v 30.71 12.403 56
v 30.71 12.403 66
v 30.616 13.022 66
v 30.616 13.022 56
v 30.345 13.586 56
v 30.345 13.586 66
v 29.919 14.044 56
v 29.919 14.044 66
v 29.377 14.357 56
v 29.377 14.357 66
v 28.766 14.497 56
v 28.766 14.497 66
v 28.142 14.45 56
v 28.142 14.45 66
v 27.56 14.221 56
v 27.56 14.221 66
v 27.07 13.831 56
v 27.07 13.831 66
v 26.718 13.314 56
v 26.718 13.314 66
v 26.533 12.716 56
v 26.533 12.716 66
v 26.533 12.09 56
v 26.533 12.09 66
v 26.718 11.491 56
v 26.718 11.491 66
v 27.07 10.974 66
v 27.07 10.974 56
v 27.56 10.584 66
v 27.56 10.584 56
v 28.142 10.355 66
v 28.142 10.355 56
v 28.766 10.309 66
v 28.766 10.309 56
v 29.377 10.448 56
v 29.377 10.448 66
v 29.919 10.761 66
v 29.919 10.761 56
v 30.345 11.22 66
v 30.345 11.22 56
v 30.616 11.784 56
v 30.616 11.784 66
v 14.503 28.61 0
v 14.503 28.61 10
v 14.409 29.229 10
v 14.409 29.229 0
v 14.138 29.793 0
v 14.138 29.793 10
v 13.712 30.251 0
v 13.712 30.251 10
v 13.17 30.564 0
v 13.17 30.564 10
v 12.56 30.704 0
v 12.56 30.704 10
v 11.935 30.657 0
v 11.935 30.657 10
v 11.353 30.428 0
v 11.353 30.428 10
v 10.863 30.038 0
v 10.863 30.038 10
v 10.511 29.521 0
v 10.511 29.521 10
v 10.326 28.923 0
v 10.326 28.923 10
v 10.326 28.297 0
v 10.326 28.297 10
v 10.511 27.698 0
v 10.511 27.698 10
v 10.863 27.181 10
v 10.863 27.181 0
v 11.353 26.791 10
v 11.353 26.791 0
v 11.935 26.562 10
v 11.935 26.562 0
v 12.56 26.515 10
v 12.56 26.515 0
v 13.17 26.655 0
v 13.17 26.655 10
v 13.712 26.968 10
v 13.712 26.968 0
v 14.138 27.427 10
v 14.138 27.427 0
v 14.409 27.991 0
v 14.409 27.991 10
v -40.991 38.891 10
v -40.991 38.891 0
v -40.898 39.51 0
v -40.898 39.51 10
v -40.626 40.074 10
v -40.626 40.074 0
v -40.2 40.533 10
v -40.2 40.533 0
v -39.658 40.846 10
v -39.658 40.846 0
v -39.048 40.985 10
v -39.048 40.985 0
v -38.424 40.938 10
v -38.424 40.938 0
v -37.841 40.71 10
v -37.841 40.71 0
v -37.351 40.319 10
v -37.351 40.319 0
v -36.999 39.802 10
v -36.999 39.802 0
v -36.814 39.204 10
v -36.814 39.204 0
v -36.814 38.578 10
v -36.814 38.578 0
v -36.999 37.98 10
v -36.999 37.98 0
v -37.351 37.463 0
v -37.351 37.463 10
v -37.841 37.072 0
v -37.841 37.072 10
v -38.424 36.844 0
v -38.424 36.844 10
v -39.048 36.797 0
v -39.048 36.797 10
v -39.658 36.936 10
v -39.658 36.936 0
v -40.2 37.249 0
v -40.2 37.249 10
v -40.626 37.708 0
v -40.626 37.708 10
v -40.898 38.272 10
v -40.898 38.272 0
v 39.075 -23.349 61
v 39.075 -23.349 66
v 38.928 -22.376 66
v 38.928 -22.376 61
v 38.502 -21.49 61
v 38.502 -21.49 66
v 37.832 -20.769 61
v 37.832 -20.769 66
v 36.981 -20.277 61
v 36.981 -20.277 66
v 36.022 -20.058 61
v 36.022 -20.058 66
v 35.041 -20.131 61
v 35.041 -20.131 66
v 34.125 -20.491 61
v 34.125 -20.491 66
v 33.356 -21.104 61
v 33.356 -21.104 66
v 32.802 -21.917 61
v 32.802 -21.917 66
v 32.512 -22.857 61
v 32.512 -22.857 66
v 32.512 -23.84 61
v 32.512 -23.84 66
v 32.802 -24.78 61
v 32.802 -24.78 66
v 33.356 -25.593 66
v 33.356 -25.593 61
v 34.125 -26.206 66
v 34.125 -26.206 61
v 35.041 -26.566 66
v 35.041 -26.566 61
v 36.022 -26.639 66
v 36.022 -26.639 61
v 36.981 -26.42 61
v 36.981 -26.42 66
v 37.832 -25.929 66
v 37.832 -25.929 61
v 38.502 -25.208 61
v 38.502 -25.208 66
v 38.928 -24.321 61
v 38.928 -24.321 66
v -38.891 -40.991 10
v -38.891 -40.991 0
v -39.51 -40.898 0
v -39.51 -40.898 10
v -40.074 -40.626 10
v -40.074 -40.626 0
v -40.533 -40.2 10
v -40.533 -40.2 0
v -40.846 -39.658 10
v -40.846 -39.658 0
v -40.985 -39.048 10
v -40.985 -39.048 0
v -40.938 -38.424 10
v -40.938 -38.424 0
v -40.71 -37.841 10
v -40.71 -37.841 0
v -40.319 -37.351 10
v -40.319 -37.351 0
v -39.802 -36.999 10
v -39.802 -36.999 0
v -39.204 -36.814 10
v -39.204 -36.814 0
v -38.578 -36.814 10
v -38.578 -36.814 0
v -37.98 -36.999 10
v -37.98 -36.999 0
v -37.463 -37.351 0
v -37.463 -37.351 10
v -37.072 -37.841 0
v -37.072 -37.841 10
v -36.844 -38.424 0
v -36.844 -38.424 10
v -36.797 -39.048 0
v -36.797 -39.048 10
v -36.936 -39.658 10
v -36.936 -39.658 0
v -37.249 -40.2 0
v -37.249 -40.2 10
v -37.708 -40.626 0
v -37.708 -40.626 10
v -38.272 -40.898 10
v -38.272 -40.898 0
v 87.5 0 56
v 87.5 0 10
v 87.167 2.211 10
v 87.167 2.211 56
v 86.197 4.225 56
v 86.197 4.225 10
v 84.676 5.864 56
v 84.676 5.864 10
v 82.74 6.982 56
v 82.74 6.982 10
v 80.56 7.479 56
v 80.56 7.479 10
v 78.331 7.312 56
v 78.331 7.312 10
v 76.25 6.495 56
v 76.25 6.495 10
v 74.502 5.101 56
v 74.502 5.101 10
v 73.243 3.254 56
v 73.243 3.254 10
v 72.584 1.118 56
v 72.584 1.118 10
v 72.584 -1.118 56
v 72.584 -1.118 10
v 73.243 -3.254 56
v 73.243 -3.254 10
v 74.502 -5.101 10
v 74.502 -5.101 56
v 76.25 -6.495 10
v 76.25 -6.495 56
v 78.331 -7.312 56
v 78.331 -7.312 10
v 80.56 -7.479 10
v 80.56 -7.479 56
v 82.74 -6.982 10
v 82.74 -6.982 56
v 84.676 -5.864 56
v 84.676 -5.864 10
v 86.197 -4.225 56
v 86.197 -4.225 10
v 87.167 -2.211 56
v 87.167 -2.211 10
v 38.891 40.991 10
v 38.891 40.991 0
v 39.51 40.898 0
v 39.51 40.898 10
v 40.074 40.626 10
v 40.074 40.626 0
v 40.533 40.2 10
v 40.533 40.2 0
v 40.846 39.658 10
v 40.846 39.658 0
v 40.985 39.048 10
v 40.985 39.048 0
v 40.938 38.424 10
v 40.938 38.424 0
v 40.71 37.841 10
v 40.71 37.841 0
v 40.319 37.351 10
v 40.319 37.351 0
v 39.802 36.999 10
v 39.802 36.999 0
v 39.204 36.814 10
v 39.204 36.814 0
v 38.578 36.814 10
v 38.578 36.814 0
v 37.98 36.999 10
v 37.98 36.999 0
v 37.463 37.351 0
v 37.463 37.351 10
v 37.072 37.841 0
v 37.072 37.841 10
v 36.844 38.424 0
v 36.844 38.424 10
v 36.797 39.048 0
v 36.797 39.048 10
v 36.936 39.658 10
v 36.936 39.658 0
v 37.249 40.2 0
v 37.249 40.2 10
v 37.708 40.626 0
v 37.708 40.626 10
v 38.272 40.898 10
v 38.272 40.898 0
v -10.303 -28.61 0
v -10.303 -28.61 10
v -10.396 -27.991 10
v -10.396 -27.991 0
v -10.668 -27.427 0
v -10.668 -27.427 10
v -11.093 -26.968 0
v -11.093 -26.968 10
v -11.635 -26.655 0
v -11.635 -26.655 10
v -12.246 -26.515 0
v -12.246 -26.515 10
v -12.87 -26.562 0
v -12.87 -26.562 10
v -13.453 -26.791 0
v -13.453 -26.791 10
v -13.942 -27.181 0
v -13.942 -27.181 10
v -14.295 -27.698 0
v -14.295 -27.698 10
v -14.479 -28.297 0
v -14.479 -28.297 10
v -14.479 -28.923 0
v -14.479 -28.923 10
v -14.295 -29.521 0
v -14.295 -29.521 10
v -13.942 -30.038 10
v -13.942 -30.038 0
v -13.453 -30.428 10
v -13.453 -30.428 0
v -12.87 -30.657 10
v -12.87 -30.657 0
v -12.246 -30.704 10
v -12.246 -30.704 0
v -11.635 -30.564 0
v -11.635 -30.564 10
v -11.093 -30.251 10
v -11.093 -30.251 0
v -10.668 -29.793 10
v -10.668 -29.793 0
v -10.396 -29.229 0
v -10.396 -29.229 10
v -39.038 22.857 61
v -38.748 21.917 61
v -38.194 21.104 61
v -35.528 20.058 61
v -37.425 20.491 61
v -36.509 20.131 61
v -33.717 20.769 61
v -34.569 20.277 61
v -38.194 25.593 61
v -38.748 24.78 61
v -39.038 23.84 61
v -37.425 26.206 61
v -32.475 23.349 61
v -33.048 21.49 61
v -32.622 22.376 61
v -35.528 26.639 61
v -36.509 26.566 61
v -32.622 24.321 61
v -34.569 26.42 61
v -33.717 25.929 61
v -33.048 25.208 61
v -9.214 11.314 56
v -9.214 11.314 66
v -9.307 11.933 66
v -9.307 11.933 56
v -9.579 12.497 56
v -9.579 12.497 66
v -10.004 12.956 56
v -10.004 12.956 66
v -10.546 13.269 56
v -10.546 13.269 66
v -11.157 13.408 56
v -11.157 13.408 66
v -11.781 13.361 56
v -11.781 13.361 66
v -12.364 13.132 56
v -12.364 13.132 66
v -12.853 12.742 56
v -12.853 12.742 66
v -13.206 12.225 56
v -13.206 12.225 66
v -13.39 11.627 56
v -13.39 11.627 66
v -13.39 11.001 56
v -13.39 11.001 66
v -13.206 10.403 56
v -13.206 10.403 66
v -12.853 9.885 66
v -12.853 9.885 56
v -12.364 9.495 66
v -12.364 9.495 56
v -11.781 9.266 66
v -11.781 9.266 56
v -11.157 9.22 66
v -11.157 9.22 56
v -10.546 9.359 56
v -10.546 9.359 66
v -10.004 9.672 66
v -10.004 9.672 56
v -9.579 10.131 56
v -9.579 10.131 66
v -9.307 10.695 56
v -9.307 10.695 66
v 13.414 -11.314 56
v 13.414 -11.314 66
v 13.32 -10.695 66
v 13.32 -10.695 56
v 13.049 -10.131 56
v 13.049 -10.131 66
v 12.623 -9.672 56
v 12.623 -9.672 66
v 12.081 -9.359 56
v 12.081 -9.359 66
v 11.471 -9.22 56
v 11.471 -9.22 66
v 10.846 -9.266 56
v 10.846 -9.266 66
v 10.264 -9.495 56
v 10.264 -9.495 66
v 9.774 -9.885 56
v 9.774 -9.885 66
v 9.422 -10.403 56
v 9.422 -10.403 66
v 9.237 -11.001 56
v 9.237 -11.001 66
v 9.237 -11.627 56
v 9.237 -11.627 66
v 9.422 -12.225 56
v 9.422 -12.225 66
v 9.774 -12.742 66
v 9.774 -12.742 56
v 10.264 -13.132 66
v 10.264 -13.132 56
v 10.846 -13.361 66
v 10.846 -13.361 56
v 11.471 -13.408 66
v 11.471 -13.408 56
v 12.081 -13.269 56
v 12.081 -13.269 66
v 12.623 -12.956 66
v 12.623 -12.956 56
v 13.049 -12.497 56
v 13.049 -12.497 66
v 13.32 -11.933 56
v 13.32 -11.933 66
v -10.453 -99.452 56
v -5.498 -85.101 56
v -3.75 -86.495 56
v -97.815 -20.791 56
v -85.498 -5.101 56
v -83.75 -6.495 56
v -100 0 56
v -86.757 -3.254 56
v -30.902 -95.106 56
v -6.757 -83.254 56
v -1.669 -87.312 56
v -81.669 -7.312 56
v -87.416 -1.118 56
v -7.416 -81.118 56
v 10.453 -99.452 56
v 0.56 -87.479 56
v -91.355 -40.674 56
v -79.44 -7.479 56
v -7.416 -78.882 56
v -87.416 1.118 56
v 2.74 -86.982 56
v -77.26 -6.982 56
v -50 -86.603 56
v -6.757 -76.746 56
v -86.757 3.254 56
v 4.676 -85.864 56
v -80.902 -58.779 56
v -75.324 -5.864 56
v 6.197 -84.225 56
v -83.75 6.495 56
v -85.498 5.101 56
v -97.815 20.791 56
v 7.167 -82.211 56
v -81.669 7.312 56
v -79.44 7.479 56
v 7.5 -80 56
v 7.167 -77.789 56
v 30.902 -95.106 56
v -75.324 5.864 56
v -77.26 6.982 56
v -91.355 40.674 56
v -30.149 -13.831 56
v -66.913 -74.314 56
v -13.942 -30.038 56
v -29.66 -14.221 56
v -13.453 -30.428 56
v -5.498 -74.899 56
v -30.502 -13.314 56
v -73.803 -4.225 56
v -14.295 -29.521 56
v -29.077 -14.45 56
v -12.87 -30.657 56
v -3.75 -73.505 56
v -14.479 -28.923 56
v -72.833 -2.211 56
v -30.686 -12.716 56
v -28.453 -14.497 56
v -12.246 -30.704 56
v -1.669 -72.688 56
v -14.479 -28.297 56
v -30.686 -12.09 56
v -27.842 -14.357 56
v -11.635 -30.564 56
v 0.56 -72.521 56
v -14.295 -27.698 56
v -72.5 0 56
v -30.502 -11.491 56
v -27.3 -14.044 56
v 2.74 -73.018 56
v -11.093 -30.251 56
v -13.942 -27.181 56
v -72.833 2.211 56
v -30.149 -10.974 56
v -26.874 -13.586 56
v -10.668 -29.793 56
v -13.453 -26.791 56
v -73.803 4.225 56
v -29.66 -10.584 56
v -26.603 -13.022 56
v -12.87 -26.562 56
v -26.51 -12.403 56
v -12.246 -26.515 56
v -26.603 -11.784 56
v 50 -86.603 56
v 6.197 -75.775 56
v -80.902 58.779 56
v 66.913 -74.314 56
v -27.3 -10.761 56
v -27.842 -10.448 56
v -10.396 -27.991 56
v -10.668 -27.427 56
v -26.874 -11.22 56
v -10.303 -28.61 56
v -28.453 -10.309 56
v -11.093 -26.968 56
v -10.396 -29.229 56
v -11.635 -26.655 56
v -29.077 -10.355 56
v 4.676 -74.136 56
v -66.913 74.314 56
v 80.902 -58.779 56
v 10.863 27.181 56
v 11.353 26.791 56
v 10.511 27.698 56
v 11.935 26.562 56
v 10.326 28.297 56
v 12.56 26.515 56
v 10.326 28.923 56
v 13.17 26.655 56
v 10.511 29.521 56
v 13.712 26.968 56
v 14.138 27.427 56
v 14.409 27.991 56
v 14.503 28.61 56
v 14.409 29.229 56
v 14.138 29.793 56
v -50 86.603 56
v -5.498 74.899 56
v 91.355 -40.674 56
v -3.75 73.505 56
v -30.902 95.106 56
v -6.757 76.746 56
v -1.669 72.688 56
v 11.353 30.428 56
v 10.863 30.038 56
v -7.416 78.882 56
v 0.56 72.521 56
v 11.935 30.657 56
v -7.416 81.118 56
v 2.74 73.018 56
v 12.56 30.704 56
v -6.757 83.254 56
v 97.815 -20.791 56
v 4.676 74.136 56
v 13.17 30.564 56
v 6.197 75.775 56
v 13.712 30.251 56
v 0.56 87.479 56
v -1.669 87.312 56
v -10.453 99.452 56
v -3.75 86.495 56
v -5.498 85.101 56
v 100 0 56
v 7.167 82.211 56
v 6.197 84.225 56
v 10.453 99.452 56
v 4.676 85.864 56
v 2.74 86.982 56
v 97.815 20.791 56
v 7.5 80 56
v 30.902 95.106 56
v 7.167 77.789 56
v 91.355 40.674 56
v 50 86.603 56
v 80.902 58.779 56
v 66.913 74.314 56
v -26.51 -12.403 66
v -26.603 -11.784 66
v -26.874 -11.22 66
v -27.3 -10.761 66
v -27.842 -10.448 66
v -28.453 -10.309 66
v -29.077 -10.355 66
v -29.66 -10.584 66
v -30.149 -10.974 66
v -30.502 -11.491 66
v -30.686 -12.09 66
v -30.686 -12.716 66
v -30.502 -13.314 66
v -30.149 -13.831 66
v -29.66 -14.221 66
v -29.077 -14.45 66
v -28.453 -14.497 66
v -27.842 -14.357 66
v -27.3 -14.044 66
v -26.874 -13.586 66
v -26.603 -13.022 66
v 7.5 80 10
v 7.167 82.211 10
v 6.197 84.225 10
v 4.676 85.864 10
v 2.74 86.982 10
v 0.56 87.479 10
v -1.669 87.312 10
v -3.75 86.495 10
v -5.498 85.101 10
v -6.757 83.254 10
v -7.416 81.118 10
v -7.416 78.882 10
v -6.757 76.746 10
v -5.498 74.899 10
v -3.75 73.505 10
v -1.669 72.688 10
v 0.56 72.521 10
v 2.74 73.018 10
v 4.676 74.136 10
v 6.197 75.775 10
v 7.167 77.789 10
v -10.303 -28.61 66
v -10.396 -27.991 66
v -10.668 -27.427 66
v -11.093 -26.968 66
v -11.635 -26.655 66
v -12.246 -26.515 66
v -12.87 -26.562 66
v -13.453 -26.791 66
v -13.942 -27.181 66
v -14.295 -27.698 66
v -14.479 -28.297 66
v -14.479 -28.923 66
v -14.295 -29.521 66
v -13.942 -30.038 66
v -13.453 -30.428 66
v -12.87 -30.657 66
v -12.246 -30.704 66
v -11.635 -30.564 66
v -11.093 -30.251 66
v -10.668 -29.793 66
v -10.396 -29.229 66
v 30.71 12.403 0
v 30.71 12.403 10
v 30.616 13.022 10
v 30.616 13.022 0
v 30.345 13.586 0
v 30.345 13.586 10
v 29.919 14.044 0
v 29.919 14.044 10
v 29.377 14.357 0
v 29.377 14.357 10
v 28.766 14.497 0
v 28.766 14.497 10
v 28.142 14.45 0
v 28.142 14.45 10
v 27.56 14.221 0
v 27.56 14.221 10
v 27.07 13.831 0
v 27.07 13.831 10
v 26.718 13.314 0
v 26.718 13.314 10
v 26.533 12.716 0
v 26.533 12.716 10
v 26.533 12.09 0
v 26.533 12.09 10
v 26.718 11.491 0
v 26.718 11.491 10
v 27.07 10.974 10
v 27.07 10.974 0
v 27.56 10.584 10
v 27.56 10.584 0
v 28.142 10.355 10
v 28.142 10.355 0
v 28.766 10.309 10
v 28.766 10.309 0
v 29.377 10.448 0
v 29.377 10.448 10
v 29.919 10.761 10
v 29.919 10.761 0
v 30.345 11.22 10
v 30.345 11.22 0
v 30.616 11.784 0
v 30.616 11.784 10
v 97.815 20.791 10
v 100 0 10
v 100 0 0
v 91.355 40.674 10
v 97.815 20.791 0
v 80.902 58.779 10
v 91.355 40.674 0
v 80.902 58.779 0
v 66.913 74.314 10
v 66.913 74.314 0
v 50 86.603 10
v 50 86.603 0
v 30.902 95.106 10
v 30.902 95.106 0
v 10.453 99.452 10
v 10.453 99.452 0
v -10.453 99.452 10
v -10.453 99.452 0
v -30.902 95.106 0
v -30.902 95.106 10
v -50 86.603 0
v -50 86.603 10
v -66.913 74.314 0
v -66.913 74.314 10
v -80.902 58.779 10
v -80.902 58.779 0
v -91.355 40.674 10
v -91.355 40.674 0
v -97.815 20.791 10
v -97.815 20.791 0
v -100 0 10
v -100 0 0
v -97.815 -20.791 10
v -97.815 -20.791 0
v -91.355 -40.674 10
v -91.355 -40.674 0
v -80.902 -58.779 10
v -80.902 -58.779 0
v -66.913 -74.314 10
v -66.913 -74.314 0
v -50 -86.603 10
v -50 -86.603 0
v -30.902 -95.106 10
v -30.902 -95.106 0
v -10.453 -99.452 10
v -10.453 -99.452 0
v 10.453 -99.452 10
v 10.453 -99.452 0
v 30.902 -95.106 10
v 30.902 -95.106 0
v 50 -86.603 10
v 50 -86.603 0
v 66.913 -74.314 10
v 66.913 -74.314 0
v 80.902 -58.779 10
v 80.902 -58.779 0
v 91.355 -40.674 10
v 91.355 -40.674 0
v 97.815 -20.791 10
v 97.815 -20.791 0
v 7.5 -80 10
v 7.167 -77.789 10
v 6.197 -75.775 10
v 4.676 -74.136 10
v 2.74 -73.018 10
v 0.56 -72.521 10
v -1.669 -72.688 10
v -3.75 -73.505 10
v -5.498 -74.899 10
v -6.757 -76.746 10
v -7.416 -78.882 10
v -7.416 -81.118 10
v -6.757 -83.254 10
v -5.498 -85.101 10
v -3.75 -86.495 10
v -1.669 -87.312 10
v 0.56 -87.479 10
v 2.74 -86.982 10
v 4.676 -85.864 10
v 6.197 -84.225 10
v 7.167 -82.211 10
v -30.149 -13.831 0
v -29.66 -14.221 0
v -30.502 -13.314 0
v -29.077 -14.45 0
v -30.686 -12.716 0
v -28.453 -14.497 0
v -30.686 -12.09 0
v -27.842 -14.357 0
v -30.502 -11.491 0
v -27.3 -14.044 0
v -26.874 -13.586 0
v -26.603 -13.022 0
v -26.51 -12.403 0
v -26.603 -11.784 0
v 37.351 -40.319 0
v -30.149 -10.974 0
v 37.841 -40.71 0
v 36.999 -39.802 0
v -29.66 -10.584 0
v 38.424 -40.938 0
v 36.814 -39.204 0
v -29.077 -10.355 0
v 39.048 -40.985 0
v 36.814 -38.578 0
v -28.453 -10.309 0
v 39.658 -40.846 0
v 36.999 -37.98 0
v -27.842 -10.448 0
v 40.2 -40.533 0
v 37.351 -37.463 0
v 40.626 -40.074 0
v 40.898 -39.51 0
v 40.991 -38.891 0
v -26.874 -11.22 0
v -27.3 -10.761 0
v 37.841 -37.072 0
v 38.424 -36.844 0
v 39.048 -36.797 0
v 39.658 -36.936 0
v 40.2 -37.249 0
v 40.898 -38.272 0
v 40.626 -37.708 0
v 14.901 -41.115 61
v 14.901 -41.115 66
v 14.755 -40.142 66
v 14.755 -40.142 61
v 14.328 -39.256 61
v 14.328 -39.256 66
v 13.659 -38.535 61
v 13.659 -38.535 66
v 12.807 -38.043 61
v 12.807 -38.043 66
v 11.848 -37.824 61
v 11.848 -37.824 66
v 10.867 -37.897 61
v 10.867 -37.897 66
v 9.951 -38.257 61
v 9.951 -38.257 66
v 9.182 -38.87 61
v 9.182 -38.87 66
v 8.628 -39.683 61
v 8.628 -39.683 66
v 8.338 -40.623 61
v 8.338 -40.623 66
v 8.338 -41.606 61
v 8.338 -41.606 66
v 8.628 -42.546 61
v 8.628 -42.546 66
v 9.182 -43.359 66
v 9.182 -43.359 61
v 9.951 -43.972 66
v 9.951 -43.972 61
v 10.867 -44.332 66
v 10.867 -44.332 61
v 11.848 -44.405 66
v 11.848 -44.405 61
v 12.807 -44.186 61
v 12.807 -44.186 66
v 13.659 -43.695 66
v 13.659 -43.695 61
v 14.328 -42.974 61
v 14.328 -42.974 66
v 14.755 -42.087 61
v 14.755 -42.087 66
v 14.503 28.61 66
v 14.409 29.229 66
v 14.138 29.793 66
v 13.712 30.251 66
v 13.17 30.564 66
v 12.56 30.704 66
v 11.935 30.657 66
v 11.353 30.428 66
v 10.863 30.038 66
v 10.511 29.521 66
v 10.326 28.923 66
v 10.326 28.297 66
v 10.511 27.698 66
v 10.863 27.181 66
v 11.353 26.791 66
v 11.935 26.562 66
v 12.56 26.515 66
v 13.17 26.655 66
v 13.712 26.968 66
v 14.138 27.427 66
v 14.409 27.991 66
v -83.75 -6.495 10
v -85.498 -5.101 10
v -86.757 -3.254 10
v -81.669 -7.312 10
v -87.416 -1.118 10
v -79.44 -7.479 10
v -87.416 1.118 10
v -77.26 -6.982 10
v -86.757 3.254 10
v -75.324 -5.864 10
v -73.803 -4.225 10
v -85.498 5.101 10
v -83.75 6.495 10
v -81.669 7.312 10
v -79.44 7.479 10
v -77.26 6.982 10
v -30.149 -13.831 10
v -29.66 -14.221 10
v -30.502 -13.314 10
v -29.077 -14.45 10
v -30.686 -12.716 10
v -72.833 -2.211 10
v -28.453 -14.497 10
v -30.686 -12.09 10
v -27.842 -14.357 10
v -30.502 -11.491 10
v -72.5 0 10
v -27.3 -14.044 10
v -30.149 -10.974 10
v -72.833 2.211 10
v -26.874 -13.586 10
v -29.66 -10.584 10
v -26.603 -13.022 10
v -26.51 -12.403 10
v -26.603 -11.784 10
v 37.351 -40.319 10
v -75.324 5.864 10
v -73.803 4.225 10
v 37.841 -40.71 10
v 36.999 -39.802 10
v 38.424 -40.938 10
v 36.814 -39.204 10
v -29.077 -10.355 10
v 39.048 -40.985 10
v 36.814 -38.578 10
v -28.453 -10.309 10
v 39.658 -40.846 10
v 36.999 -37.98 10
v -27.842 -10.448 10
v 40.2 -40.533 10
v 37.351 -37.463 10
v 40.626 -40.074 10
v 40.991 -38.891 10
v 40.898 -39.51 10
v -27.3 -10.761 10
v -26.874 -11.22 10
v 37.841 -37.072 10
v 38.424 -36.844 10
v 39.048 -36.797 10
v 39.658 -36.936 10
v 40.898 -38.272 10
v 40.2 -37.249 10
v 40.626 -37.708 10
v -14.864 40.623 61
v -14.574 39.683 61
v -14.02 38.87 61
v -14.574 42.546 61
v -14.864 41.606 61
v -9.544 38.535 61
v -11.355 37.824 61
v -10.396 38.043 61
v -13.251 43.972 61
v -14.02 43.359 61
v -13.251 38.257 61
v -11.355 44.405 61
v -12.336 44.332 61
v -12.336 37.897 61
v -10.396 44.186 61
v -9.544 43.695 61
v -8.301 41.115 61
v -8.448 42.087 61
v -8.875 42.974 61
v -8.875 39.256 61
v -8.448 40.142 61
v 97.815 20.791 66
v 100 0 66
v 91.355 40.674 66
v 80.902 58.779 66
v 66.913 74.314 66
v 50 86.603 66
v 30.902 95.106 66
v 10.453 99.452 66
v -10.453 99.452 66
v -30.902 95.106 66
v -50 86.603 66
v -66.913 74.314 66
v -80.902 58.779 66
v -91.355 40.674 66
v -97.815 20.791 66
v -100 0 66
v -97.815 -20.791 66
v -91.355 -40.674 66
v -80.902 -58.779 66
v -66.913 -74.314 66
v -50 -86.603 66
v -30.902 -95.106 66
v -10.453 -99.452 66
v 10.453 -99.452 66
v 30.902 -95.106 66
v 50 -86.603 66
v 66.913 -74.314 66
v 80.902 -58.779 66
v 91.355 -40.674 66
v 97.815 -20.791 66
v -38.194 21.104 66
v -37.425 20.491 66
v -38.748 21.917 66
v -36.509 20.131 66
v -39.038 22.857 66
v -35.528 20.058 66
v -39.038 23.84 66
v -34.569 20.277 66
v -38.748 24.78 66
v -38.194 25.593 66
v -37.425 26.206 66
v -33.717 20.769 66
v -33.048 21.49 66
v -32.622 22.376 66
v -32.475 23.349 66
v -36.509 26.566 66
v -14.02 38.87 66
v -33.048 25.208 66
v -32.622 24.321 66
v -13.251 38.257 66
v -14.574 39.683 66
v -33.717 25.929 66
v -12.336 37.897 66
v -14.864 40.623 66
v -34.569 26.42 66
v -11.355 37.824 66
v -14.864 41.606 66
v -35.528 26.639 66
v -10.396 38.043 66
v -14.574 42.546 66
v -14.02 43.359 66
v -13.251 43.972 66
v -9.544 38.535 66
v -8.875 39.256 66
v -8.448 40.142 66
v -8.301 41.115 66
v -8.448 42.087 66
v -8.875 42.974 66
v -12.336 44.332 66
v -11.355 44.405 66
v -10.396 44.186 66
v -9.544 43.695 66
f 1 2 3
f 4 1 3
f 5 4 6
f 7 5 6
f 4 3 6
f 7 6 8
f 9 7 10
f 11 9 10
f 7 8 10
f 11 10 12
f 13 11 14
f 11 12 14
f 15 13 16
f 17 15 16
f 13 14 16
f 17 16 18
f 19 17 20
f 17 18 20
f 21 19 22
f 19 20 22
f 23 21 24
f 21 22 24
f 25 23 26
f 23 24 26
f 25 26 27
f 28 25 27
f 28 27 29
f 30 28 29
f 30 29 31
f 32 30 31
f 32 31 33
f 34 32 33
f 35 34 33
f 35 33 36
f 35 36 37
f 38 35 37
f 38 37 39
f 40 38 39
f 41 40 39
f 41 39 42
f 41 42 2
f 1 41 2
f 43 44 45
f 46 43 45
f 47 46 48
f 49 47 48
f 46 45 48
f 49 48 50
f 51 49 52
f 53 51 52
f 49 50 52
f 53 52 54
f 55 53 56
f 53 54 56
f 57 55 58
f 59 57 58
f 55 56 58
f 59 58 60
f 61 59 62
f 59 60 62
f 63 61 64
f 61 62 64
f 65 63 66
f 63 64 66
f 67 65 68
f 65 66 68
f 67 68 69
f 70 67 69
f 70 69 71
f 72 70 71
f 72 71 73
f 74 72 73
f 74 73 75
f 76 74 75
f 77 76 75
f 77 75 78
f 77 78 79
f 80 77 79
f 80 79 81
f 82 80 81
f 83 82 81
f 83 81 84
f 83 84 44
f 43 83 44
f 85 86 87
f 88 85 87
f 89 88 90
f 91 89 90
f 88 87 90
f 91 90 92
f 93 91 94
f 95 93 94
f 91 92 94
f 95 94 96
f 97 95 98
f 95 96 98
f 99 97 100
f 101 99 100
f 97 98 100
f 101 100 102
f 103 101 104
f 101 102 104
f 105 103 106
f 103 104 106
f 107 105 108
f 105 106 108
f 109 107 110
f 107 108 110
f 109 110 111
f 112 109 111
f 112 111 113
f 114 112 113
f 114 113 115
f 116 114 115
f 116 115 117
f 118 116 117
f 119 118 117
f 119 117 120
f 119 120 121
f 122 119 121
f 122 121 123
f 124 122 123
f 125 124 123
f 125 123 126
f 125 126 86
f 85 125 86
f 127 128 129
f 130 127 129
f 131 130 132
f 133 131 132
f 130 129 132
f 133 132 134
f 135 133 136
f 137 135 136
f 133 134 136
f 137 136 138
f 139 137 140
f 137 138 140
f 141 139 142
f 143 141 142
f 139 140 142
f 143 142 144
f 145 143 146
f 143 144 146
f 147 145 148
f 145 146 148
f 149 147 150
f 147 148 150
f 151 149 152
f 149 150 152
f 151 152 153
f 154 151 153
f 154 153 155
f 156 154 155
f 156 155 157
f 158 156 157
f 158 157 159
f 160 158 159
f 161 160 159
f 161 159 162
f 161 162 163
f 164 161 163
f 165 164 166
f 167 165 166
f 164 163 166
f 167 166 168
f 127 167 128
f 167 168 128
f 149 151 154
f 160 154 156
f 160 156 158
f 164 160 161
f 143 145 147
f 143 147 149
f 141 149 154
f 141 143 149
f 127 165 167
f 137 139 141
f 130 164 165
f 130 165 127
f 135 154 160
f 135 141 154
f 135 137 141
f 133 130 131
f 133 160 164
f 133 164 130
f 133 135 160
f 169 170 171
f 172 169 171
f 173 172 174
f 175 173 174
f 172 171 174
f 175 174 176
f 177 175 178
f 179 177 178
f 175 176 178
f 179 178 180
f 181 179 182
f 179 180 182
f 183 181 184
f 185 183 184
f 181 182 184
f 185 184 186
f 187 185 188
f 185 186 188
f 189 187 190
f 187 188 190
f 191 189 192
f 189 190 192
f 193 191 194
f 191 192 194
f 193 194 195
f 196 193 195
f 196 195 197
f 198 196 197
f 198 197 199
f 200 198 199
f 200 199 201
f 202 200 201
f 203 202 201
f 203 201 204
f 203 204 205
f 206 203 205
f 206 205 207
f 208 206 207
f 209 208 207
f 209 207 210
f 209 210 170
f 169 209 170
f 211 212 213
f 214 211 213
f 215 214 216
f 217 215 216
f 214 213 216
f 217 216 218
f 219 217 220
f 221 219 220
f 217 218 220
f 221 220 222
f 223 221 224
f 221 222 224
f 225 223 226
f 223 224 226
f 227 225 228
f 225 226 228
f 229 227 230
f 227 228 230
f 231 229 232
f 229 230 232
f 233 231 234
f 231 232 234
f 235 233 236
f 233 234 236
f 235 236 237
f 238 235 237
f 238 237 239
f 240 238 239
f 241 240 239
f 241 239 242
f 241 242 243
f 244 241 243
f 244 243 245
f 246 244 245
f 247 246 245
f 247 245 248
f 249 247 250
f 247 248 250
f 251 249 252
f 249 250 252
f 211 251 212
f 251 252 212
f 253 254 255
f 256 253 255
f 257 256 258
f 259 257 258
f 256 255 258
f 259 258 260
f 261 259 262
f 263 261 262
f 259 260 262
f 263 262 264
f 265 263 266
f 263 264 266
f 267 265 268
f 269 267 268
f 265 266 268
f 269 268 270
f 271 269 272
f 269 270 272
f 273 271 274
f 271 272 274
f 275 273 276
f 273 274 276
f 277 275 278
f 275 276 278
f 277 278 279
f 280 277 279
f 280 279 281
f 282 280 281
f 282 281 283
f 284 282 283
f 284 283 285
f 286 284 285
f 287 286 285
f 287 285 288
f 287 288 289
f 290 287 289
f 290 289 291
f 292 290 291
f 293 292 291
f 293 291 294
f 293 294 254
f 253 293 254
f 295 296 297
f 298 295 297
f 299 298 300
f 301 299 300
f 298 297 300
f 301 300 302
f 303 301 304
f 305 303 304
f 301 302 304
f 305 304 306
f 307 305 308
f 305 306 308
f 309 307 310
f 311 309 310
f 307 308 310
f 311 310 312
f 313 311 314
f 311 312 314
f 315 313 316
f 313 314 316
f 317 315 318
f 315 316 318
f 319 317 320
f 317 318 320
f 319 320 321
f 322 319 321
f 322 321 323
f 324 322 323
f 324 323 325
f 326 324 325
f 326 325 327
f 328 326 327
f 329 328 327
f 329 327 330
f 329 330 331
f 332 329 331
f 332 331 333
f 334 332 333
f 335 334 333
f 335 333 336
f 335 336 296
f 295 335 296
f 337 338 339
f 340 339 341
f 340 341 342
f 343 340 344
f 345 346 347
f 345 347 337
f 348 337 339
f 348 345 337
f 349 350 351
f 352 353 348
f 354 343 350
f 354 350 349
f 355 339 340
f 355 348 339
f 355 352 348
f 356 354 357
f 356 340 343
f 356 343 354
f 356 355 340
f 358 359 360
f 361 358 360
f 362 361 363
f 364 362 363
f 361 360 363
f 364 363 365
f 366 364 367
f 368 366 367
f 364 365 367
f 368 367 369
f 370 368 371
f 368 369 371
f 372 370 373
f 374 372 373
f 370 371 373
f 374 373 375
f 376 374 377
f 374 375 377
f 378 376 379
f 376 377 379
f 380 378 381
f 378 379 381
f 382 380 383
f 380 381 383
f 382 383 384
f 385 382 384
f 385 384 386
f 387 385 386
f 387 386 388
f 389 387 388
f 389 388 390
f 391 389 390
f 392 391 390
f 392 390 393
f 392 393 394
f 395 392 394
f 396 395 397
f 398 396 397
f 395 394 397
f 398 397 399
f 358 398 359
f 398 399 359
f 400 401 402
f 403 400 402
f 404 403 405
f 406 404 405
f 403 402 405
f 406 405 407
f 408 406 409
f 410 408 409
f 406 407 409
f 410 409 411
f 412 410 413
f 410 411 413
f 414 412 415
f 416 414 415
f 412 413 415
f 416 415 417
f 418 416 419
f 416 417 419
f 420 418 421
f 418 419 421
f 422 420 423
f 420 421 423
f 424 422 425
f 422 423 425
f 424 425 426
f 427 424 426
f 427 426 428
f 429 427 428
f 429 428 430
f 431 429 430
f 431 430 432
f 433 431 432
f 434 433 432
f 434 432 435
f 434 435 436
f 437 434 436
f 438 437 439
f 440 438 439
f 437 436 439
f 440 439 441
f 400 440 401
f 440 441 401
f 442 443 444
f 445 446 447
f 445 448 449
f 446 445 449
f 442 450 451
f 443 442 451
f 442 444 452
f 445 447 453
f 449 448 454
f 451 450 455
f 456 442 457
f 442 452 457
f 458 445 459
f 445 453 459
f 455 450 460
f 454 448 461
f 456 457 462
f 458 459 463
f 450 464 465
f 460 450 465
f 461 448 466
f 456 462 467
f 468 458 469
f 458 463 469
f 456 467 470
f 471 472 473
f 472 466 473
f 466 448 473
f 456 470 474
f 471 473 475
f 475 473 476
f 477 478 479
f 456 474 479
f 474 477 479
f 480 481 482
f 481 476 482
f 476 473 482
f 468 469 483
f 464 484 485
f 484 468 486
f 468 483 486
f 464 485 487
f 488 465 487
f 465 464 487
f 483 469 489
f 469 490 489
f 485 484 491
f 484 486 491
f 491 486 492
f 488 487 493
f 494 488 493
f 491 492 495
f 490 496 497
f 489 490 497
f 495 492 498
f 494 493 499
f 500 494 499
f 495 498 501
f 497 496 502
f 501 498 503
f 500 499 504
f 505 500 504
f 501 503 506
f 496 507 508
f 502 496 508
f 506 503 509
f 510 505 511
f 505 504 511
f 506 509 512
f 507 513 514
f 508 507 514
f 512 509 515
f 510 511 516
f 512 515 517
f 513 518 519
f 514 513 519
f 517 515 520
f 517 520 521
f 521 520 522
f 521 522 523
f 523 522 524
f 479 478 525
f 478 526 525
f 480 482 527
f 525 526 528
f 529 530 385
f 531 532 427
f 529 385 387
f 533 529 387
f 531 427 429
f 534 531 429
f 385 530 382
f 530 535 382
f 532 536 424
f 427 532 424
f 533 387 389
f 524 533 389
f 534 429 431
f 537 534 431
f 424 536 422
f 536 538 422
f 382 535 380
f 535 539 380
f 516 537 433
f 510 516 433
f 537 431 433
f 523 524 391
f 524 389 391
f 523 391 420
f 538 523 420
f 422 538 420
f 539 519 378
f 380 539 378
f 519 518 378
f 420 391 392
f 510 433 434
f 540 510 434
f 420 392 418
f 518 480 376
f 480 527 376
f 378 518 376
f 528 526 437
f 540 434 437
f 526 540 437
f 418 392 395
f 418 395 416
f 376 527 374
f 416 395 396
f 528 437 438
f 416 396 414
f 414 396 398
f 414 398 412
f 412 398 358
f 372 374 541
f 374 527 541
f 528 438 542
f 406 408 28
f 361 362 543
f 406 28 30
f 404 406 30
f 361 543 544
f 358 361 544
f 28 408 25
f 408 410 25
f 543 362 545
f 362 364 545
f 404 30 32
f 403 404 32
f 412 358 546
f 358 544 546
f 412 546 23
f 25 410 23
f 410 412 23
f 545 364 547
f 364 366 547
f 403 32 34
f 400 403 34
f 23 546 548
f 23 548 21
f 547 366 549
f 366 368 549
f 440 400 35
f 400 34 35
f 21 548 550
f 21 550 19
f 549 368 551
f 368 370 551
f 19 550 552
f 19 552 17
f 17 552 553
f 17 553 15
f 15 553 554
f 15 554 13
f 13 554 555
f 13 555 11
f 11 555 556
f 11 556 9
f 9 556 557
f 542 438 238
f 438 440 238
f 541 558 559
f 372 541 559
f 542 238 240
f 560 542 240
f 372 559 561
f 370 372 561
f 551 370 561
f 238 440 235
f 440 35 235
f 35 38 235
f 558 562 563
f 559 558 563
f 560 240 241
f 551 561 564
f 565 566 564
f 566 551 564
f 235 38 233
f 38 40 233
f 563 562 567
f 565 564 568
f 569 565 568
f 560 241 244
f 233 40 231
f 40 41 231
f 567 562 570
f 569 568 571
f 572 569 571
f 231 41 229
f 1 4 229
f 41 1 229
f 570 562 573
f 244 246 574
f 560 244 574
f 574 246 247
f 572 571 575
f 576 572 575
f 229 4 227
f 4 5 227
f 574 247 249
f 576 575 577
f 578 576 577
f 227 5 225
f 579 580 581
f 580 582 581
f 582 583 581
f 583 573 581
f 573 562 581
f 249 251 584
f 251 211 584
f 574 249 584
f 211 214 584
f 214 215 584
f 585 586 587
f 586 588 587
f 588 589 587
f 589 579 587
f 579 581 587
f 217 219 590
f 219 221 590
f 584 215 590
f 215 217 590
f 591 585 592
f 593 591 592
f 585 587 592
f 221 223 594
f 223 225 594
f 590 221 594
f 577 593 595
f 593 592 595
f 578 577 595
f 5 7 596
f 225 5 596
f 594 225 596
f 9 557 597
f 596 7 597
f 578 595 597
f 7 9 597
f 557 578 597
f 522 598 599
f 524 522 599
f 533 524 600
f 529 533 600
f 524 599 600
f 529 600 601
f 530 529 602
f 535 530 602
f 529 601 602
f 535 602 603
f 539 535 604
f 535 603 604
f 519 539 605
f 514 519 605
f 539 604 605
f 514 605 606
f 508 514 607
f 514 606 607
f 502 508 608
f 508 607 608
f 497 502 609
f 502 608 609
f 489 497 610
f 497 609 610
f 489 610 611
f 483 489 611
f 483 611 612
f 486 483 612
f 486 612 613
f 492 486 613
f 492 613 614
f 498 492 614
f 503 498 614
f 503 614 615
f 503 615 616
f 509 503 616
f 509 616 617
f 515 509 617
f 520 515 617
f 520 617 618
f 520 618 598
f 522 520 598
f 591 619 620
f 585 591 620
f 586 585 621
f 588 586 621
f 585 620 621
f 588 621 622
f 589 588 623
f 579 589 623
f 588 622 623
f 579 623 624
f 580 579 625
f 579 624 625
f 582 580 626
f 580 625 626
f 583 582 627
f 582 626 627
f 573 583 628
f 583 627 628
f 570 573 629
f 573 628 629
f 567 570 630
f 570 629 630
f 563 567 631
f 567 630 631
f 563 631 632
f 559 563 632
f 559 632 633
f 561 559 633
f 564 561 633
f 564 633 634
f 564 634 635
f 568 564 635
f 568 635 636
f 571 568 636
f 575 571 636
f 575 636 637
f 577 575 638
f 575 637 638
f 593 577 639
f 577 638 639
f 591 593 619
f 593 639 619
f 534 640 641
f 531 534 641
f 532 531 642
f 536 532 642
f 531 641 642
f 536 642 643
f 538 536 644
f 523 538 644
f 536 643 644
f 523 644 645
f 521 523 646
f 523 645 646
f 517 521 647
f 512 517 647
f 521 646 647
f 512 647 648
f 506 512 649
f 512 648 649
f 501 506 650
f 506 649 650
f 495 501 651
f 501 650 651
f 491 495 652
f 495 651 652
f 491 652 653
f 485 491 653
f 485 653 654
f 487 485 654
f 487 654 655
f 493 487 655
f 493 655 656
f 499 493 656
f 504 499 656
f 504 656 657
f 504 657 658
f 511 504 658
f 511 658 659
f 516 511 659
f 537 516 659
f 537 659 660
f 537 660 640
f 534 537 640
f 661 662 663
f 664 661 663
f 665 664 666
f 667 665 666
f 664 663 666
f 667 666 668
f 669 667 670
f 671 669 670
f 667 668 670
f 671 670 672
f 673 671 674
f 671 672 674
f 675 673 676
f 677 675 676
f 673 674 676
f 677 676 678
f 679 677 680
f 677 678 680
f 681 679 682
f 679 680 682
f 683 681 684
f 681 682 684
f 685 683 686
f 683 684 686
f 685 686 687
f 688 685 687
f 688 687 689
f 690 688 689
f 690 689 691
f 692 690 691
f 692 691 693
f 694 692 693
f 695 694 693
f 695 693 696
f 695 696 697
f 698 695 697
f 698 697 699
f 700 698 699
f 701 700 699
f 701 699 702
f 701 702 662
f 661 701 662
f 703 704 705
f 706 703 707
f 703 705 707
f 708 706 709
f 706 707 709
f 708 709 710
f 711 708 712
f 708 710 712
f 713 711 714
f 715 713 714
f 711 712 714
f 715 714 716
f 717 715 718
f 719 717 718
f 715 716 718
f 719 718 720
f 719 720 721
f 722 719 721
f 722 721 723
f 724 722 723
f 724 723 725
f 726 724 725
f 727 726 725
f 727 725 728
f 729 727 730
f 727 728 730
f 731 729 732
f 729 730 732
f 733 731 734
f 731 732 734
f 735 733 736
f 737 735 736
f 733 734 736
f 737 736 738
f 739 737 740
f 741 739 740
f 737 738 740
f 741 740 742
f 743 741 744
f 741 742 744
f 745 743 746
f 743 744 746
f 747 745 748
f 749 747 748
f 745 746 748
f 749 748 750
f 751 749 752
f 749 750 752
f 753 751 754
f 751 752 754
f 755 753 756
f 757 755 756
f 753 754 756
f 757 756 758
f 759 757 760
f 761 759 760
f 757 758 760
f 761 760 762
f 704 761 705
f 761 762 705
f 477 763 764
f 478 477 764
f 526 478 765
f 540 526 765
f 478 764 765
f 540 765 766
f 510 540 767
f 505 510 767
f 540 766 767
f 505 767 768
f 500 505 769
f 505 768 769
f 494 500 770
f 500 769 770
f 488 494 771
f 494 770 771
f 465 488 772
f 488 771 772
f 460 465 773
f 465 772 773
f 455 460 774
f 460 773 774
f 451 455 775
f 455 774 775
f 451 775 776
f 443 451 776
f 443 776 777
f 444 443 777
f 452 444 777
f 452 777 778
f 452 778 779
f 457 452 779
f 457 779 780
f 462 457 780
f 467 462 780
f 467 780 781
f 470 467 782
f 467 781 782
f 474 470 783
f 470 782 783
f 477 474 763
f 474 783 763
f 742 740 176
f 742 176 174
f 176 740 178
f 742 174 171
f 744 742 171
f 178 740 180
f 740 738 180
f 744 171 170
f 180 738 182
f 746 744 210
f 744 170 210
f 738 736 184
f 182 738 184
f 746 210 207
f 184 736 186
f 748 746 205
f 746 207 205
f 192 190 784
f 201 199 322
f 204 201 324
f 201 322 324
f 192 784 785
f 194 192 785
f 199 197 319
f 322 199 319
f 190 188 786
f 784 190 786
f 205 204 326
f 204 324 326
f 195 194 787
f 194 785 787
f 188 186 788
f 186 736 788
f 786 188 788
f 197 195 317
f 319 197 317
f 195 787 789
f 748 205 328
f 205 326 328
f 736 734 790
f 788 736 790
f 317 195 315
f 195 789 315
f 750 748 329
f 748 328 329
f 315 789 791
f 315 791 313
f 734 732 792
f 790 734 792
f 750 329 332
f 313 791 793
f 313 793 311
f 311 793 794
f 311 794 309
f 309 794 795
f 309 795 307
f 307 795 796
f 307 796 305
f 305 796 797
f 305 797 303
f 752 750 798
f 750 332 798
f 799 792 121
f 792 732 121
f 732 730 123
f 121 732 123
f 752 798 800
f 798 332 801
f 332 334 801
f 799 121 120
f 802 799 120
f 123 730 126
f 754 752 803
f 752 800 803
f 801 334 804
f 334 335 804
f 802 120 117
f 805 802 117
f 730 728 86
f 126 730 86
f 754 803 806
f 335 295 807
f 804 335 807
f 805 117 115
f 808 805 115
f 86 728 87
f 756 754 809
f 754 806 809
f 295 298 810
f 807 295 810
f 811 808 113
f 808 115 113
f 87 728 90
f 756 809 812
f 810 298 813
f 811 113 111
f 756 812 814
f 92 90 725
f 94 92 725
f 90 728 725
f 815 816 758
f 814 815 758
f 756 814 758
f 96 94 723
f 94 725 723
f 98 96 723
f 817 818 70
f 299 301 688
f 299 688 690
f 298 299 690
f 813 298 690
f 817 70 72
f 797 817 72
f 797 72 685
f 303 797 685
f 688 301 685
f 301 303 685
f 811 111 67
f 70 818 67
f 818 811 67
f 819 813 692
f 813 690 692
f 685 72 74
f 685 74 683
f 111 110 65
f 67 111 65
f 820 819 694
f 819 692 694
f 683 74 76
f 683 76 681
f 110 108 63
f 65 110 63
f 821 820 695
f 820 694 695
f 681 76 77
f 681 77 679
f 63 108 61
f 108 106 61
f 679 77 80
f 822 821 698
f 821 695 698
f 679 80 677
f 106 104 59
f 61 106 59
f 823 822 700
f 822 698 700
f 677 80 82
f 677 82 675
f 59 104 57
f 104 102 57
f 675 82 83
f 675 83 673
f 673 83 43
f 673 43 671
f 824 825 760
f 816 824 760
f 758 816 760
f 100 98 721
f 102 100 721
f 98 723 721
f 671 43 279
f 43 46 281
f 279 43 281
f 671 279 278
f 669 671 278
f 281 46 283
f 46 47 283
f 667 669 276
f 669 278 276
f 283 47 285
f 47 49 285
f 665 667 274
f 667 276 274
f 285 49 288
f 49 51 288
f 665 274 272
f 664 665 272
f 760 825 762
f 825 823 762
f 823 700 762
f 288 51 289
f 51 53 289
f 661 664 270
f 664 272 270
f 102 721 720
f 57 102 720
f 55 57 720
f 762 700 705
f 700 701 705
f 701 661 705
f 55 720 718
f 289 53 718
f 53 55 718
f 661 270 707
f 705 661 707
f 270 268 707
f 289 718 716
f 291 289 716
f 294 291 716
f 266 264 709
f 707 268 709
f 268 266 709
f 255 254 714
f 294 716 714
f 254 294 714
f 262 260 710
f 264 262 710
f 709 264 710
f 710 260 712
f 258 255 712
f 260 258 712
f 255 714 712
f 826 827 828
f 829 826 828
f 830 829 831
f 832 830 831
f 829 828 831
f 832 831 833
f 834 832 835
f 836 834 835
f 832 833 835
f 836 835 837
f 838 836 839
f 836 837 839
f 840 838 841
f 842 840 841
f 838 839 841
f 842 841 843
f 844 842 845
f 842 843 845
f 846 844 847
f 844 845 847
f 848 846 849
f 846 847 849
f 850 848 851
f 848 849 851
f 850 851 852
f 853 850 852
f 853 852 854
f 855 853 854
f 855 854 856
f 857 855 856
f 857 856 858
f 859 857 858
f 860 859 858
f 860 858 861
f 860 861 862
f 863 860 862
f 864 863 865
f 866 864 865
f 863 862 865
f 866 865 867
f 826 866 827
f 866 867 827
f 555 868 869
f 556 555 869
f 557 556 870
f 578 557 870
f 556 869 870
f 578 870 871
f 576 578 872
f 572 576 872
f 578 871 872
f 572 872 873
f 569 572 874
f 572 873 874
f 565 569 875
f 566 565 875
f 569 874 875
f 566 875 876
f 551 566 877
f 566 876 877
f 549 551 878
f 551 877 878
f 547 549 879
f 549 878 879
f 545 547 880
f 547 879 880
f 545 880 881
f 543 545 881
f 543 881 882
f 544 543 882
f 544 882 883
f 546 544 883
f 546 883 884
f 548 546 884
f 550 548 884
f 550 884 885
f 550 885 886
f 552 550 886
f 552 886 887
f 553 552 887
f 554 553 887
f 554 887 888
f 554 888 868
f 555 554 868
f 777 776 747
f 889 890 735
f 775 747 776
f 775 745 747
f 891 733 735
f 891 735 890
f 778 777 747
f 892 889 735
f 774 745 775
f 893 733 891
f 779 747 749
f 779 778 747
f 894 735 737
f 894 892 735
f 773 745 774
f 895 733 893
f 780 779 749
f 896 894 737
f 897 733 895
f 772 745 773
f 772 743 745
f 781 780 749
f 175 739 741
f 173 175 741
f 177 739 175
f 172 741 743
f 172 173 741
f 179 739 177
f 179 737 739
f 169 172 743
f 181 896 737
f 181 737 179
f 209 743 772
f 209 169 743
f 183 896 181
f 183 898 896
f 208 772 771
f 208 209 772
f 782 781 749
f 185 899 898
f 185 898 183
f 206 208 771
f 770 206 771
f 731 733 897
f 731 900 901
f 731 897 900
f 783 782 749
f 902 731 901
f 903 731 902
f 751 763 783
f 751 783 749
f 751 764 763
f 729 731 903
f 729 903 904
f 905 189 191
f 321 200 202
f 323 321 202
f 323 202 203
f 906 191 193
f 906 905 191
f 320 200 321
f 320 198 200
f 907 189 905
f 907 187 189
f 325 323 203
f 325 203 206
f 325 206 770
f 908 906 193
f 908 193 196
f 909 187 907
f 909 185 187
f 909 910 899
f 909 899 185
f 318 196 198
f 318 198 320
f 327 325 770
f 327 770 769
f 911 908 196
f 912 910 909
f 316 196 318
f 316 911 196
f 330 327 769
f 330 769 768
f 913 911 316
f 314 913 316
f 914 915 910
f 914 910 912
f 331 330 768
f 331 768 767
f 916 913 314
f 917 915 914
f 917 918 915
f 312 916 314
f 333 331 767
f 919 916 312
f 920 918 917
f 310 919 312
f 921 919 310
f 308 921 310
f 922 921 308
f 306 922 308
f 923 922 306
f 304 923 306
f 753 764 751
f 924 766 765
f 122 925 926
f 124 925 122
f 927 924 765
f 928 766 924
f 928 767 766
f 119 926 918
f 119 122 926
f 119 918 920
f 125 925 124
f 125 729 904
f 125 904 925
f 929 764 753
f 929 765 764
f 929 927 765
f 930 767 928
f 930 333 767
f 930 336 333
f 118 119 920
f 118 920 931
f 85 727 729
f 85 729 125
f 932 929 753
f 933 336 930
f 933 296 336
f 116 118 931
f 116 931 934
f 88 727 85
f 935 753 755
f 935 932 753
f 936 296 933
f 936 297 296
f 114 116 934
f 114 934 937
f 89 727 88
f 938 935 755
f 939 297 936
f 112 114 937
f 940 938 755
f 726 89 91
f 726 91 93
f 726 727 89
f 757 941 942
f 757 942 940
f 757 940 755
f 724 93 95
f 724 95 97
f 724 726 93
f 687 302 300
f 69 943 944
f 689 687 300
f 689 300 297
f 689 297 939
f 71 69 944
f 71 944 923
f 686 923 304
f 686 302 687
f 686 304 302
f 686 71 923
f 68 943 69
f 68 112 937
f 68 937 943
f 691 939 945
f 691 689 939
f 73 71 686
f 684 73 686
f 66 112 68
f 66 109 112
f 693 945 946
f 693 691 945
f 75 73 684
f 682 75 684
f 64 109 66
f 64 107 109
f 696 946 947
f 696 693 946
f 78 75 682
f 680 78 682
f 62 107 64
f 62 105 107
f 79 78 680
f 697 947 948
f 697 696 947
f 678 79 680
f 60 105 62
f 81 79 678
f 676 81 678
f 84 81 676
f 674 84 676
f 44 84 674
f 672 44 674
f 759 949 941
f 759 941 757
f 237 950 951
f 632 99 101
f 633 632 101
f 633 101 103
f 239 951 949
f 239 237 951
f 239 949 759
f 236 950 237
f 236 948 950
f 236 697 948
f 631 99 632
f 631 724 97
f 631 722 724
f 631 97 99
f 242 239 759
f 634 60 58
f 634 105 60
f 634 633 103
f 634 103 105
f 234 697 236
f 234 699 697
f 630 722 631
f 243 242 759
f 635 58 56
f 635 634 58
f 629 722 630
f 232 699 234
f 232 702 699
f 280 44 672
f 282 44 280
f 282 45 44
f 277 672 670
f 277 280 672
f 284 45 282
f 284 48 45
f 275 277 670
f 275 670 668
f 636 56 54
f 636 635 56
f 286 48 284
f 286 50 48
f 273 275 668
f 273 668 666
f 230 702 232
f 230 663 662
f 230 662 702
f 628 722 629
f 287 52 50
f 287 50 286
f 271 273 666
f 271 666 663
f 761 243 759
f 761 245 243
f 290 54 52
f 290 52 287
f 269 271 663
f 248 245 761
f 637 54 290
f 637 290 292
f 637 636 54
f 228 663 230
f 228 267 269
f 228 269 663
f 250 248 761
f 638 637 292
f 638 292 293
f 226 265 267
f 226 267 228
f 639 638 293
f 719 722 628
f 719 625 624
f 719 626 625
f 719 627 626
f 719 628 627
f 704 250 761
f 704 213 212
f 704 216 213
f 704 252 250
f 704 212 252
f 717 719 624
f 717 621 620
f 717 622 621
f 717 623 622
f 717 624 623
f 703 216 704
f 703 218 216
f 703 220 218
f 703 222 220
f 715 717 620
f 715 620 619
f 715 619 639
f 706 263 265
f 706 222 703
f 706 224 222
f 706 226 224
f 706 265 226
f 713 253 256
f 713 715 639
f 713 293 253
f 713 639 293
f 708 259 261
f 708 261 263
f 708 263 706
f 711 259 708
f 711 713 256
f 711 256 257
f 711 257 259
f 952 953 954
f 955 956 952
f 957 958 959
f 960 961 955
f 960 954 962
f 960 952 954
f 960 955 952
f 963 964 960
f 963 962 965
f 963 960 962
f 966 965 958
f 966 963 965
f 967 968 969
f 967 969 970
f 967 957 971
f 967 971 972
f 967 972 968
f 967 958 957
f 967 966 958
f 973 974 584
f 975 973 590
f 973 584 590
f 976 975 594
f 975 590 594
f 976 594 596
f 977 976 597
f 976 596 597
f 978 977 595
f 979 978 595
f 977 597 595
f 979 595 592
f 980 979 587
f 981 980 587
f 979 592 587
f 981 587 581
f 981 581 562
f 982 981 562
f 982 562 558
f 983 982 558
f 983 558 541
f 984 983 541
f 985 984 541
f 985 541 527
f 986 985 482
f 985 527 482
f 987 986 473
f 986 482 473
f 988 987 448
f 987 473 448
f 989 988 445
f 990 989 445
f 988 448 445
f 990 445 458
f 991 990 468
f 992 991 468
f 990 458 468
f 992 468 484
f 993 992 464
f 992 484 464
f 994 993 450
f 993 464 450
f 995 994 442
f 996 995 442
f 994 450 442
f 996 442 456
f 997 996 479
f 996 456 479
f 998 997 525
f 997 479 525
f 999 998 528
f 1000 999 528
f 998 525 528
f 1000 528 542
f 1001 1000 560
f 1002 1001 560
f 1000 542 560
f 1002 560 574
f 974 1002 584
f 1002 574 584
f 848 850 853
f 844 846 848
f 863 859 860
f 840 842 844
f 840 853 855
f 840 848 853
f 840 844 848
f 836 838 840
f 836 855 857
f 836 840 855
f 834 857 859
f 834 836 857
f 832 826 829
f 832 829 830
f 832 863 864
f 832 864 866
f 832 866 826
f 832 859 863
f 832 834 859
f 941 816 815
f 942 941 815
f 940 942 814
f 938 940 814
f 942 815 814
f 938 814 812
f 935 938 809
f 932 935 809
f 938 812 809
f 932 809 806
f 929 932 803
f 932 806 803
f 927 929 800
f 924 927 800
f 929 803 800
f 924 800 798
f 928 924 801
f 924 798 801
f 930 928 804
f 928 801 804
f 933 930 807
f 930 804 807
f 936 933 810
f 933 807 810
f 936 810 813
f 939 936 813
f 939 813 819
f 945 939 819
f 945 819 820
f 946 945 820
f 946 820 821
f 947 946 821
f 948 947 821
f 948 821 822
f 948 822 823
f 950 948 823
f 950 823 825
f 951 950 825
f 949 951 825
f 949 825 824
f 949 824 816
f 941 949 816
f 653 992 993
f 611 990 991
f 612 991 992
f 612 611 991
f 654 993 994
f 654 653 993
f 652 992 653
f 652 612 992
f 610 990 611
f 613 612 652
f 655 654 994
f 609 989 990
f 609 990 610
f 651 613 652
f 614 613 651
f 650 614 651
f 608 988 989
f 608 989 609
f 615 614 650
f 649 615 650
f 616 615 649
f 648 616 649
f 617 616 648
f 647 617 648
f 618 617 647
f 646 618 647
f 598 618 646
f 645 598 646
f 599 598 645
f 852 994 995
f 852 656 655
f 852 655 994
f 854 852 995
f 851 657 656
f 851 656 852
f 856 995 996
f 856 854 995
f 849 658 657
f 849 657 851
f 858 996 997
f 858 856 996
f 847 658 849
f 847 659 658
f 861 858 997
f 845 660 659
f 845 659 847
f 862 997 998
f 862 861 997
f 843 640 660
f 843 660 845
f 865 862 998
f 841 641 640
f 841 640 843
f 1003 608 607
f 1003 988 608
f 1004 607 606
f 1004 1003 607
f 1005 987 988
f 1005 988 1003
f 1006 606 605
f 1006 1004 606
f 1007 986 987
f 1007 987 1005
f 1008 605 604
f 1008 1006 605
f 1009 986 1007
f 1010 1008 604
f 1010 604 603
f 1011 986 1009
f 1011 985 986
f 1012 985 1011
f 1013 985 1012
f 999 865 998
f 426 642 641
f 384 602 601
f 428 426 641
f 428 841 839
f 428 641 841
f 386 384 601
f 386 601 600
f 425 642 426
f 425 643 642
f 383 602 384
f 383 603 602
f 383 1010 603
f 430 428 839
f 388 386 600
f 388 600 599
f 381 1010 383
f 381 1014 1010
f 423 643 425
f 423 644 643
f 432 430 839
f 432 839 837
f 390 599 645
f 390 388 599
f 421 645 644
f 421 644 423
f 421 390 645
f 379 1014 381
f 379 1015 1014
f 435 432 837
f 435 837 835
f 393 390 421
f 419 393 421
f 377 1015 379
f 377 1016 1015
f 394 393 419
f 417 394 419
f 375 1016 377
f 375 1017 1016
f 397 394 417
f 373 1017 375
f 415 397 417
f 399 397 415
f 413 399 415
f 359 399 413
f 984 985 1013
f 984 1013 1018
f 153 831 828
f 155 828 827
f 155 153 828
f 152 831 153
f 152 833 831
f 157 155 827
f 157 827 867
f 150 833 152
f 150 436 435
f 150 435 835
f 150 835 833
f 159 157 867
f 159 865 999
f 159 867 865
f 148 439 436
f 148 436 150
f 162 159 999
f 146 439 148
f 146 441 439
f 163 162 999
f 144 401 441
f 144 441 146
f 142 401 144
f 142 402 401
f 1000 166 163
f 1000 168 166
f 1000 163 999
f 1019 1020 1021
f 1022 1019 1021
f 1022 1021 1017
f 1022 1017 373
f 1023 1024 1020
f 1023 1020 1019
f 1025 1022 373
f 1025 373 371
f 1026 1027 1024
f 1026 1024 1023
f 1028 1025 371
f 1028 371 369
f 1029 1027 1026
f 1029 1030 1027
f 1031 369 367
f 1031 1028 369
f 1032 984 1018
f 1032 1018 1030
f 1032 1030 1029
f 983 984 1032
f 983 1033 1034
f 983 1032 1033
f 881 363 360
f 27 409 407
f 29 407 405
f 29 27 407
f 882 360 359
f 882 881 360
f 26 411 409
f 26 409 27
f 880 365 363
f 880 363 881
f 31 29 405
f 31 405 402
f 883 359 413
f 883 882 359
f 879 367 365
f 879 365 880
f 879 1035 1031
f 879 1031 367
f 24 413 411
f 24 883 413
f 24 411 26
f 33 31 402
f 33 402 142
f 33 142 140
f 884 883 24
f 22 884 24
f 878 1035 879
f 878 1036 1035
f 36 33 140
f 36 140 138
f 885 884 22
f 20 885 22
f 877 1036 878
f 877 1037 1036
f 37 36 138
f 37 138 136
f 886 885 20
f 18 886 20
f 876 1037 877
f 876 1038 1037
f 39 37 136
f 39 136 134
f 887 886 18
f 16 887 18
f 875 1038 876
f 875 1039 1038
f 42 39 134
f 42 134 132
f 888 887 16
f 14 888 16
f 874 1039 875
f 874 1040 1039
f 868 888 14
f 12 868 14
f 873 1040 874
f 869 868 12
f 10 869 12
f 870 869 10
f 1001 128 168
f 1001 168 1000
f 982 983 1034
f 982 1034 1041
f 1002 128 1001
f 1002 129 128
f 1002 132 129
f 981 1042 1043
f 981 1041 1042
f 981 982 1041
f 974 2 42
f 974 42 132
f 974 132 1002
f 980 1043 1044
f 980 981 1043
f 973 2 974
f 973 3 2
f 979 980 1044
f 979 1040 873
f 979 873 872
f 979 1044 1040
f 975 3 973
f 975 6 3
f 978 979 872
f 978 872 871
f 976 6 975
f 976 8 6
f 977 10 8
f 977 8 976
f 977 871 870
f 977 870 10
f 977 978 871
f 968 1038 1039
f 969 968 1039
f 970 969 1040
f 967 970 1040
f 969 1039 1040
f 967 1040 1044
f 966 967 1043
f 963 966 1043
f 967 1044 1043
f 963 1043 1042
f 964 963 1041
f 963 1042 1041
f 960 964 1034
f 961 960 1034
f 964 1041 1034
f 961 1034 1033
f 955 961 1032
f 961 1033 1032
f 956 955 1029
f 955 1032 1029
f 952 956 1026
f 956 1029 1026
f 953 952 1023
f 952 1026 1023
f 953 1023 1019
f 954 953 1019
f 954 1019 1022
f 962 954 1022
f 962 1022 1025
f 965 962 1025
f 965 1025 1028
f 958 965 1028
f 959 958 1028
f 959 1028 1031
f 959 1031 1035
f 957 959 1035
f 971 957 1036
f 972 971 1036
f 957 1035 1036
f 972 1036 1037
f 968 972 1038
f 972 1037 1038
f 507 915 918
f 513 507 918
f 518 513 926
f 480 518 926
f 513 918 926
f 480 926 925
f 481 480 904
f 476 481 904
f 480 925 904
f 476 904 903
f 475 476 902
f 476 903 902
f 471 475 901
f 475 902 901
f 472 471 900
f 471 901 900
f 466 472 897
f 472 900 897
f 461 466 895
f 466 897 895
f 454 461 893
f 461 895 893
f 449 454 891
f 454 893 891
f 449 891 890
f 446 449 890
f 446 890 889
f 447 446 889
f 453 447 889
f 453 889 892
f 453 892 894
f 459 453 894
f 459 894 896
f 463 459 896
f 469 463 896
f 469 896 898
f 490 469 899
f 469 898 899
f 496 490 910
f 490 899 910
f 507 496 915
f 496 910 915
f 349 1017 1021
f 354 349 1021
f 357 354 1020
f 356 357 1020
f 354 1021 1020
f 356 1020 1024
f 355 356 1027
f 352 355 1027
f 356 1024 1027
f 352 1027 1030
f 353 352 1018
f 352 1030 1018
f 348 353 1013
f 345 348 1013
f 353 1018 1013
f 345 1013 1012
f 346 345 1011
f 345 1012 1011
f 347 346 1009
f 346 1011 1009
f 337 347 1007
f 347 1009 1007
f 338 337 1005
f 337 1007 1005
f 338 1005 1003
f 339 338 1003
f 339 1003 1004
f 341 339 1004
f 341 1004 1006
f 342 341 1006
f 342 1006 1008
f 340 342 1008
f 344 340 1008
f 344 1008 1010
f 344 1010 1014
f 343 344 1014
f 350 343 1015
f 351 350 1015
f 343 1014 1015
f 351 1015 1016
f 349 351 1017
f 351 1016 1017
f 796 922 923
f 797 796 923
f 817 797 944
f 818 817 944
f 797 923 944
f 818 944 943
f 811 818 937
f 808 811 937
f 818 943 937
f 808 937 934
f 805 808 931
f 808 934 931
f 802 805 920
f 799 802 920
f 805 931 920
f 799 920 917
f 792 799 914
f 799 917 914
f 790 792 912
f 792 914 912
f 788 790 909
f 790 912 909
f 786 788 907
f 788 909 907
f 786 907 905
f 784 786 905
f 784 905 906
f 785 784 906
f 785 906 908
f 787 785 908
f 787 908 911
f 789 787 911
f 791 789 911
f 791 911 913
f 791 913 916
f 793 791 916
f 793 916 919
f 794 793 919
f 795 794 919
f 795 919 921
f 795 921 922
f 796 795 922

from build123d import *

# Parameters (mm, degrees)
SKETCH_1_R               = 100
EXTRUDE_1_DEPTH          = 10
SKETCH_12_R              = 7.5
EXTRUDE_3_DEPTH          = 46
SKETCH_14_R              = 100
EXTRUDE_4_DEPTH          = 10
SKETCH_15_R              = 2.1
CUT_EXTRUDE_7_DEPTH      = 10
SKETCH_15_3_R            = 2.1
CUT_EXTRUDE_8_DEPTH      = 157.064089399
SKETCH_18_R              = 3.3
CUT_EXTRUDE_9_DEPTH      = 5
HOLE_WIZARD_M5_1_D       = 4.2
HOLE_WIZARD_M5_1_DEPTH   = 10
PATTERN_CIRCULAR_1_COUNT = 4


with BuildPart() as part:
    # 草图1 → 凸台-拉伸1 (new body)
    with BuildSketch(Plane.XY):
        Circle(SKETCH_1_R)
    extrude(amount=EXTRUDE_1_DEPTH)

    # 草图12 → 凸台-拉伸3 (add)
    with BuildSketch(Plane.XY.offset(10)):
        with Locations((-80, 0)):
            Circle(SKETCH_12_R)
        with Locations((0, 80)):
            Circle(SKETCH_12_R)
        with Locations((80, 0)):
            Circle(SKETCH_12_R)
        with Locations((0, -80)):
            Circle(SKETCH_12_R)
    extrude(amount=EXTRUDE_3_DEPTH)

    # 草图14 → 凸台-拉伸4 (add)
    with BuildSketch(Plane.XY.offset(56)):
        Circle(SKETCH_14_R)
    extrude(amount=EXTRUDE_4_DEPTH)

    # 草图15 → 切除-拉伸7 (cut)
    with BuildSketch(Plane.XY.offset(66)):
        with Locations((-11.313708499, 11.313708499)):
            Circle(SKETCH_15_R)
        with Locations((11.313708499, -11.313708499)):
            Circle(SKETCH_15_R)
    extrude(amount=-CUT_EXTRUDE_7_DEPTH, mode=Mode.SUBTRACT)

    # 草图15<3> → 切除-拉伸8 (cut, through all)
    with BuildSketch(Plane.XY.offset(66)):
        with Locations((12.402652942, 28.609540367)):
            Circle(SKETCH_15_3_R)
        with Locations((28.609540367, 12.402652942)):
            Circle(SKETCH_15_3_R)
        with Locations((-12.402652942, -28.609540367)):
            Circle(SKETCH_15_3_R)
        with Locations((-28.609540367, -12.402652942)):
            Circle(SKETCH_15_3_R)
    extrude(amount=-CUT_EXTRUDE_8_DEPTH, mode=Mode.SUBTRACT)

    # 草图18 → 切除-拉伸9 (cut)
    with BuildSketch(Plane.XY.offset(66)):
        with Locations((-11.601229272, 41.114613939)):
            Circle(SKETCH_18_R)
        with Locations((-35.774918891, 23.348558378)):
            Circle(SKETCH_18_R)
        with Locations((11.601229272, -41.114613939)):
            Circle(SKETCH_18_R)
        with Locations((35.774918891, -23.348558378)):
            Circle(SKETCH_18_R)
    extrude(amount=-CUT_EXTRUDE_9_DEPTH, mode=Mode.SUBTRACT)

    # M5 螺纹孔1
    with Locations(Plane(origin=(-38.890872965, 38.890872965, 10), x_dir=(1, 0, 0), z_dir=(0, 0, 1))):
        with Locations((0, 0)):
            hole_wizard_m5_1 = Hole(HOLE_WIZARD_M5_1_D / 2, depth=HOLE_WIZARD_M5_1_DEPTH)

    # 阵列(圆周)1: M5 螺纹孔1 ×4 about axis
    pattern_circular_1_axis = Axis((0, 0, 0), (0, 0, 1))
    for i in range(1, PATTERN_CIRCULAR_1_COUNT):
        add(hole_wizard_m5_1.rotate(pattern_circular_1_axis, i * 360 / PATTERN_CIRCULAR_1_COUNT), mode=Mode.SUBTRACT)


solid = part.part
